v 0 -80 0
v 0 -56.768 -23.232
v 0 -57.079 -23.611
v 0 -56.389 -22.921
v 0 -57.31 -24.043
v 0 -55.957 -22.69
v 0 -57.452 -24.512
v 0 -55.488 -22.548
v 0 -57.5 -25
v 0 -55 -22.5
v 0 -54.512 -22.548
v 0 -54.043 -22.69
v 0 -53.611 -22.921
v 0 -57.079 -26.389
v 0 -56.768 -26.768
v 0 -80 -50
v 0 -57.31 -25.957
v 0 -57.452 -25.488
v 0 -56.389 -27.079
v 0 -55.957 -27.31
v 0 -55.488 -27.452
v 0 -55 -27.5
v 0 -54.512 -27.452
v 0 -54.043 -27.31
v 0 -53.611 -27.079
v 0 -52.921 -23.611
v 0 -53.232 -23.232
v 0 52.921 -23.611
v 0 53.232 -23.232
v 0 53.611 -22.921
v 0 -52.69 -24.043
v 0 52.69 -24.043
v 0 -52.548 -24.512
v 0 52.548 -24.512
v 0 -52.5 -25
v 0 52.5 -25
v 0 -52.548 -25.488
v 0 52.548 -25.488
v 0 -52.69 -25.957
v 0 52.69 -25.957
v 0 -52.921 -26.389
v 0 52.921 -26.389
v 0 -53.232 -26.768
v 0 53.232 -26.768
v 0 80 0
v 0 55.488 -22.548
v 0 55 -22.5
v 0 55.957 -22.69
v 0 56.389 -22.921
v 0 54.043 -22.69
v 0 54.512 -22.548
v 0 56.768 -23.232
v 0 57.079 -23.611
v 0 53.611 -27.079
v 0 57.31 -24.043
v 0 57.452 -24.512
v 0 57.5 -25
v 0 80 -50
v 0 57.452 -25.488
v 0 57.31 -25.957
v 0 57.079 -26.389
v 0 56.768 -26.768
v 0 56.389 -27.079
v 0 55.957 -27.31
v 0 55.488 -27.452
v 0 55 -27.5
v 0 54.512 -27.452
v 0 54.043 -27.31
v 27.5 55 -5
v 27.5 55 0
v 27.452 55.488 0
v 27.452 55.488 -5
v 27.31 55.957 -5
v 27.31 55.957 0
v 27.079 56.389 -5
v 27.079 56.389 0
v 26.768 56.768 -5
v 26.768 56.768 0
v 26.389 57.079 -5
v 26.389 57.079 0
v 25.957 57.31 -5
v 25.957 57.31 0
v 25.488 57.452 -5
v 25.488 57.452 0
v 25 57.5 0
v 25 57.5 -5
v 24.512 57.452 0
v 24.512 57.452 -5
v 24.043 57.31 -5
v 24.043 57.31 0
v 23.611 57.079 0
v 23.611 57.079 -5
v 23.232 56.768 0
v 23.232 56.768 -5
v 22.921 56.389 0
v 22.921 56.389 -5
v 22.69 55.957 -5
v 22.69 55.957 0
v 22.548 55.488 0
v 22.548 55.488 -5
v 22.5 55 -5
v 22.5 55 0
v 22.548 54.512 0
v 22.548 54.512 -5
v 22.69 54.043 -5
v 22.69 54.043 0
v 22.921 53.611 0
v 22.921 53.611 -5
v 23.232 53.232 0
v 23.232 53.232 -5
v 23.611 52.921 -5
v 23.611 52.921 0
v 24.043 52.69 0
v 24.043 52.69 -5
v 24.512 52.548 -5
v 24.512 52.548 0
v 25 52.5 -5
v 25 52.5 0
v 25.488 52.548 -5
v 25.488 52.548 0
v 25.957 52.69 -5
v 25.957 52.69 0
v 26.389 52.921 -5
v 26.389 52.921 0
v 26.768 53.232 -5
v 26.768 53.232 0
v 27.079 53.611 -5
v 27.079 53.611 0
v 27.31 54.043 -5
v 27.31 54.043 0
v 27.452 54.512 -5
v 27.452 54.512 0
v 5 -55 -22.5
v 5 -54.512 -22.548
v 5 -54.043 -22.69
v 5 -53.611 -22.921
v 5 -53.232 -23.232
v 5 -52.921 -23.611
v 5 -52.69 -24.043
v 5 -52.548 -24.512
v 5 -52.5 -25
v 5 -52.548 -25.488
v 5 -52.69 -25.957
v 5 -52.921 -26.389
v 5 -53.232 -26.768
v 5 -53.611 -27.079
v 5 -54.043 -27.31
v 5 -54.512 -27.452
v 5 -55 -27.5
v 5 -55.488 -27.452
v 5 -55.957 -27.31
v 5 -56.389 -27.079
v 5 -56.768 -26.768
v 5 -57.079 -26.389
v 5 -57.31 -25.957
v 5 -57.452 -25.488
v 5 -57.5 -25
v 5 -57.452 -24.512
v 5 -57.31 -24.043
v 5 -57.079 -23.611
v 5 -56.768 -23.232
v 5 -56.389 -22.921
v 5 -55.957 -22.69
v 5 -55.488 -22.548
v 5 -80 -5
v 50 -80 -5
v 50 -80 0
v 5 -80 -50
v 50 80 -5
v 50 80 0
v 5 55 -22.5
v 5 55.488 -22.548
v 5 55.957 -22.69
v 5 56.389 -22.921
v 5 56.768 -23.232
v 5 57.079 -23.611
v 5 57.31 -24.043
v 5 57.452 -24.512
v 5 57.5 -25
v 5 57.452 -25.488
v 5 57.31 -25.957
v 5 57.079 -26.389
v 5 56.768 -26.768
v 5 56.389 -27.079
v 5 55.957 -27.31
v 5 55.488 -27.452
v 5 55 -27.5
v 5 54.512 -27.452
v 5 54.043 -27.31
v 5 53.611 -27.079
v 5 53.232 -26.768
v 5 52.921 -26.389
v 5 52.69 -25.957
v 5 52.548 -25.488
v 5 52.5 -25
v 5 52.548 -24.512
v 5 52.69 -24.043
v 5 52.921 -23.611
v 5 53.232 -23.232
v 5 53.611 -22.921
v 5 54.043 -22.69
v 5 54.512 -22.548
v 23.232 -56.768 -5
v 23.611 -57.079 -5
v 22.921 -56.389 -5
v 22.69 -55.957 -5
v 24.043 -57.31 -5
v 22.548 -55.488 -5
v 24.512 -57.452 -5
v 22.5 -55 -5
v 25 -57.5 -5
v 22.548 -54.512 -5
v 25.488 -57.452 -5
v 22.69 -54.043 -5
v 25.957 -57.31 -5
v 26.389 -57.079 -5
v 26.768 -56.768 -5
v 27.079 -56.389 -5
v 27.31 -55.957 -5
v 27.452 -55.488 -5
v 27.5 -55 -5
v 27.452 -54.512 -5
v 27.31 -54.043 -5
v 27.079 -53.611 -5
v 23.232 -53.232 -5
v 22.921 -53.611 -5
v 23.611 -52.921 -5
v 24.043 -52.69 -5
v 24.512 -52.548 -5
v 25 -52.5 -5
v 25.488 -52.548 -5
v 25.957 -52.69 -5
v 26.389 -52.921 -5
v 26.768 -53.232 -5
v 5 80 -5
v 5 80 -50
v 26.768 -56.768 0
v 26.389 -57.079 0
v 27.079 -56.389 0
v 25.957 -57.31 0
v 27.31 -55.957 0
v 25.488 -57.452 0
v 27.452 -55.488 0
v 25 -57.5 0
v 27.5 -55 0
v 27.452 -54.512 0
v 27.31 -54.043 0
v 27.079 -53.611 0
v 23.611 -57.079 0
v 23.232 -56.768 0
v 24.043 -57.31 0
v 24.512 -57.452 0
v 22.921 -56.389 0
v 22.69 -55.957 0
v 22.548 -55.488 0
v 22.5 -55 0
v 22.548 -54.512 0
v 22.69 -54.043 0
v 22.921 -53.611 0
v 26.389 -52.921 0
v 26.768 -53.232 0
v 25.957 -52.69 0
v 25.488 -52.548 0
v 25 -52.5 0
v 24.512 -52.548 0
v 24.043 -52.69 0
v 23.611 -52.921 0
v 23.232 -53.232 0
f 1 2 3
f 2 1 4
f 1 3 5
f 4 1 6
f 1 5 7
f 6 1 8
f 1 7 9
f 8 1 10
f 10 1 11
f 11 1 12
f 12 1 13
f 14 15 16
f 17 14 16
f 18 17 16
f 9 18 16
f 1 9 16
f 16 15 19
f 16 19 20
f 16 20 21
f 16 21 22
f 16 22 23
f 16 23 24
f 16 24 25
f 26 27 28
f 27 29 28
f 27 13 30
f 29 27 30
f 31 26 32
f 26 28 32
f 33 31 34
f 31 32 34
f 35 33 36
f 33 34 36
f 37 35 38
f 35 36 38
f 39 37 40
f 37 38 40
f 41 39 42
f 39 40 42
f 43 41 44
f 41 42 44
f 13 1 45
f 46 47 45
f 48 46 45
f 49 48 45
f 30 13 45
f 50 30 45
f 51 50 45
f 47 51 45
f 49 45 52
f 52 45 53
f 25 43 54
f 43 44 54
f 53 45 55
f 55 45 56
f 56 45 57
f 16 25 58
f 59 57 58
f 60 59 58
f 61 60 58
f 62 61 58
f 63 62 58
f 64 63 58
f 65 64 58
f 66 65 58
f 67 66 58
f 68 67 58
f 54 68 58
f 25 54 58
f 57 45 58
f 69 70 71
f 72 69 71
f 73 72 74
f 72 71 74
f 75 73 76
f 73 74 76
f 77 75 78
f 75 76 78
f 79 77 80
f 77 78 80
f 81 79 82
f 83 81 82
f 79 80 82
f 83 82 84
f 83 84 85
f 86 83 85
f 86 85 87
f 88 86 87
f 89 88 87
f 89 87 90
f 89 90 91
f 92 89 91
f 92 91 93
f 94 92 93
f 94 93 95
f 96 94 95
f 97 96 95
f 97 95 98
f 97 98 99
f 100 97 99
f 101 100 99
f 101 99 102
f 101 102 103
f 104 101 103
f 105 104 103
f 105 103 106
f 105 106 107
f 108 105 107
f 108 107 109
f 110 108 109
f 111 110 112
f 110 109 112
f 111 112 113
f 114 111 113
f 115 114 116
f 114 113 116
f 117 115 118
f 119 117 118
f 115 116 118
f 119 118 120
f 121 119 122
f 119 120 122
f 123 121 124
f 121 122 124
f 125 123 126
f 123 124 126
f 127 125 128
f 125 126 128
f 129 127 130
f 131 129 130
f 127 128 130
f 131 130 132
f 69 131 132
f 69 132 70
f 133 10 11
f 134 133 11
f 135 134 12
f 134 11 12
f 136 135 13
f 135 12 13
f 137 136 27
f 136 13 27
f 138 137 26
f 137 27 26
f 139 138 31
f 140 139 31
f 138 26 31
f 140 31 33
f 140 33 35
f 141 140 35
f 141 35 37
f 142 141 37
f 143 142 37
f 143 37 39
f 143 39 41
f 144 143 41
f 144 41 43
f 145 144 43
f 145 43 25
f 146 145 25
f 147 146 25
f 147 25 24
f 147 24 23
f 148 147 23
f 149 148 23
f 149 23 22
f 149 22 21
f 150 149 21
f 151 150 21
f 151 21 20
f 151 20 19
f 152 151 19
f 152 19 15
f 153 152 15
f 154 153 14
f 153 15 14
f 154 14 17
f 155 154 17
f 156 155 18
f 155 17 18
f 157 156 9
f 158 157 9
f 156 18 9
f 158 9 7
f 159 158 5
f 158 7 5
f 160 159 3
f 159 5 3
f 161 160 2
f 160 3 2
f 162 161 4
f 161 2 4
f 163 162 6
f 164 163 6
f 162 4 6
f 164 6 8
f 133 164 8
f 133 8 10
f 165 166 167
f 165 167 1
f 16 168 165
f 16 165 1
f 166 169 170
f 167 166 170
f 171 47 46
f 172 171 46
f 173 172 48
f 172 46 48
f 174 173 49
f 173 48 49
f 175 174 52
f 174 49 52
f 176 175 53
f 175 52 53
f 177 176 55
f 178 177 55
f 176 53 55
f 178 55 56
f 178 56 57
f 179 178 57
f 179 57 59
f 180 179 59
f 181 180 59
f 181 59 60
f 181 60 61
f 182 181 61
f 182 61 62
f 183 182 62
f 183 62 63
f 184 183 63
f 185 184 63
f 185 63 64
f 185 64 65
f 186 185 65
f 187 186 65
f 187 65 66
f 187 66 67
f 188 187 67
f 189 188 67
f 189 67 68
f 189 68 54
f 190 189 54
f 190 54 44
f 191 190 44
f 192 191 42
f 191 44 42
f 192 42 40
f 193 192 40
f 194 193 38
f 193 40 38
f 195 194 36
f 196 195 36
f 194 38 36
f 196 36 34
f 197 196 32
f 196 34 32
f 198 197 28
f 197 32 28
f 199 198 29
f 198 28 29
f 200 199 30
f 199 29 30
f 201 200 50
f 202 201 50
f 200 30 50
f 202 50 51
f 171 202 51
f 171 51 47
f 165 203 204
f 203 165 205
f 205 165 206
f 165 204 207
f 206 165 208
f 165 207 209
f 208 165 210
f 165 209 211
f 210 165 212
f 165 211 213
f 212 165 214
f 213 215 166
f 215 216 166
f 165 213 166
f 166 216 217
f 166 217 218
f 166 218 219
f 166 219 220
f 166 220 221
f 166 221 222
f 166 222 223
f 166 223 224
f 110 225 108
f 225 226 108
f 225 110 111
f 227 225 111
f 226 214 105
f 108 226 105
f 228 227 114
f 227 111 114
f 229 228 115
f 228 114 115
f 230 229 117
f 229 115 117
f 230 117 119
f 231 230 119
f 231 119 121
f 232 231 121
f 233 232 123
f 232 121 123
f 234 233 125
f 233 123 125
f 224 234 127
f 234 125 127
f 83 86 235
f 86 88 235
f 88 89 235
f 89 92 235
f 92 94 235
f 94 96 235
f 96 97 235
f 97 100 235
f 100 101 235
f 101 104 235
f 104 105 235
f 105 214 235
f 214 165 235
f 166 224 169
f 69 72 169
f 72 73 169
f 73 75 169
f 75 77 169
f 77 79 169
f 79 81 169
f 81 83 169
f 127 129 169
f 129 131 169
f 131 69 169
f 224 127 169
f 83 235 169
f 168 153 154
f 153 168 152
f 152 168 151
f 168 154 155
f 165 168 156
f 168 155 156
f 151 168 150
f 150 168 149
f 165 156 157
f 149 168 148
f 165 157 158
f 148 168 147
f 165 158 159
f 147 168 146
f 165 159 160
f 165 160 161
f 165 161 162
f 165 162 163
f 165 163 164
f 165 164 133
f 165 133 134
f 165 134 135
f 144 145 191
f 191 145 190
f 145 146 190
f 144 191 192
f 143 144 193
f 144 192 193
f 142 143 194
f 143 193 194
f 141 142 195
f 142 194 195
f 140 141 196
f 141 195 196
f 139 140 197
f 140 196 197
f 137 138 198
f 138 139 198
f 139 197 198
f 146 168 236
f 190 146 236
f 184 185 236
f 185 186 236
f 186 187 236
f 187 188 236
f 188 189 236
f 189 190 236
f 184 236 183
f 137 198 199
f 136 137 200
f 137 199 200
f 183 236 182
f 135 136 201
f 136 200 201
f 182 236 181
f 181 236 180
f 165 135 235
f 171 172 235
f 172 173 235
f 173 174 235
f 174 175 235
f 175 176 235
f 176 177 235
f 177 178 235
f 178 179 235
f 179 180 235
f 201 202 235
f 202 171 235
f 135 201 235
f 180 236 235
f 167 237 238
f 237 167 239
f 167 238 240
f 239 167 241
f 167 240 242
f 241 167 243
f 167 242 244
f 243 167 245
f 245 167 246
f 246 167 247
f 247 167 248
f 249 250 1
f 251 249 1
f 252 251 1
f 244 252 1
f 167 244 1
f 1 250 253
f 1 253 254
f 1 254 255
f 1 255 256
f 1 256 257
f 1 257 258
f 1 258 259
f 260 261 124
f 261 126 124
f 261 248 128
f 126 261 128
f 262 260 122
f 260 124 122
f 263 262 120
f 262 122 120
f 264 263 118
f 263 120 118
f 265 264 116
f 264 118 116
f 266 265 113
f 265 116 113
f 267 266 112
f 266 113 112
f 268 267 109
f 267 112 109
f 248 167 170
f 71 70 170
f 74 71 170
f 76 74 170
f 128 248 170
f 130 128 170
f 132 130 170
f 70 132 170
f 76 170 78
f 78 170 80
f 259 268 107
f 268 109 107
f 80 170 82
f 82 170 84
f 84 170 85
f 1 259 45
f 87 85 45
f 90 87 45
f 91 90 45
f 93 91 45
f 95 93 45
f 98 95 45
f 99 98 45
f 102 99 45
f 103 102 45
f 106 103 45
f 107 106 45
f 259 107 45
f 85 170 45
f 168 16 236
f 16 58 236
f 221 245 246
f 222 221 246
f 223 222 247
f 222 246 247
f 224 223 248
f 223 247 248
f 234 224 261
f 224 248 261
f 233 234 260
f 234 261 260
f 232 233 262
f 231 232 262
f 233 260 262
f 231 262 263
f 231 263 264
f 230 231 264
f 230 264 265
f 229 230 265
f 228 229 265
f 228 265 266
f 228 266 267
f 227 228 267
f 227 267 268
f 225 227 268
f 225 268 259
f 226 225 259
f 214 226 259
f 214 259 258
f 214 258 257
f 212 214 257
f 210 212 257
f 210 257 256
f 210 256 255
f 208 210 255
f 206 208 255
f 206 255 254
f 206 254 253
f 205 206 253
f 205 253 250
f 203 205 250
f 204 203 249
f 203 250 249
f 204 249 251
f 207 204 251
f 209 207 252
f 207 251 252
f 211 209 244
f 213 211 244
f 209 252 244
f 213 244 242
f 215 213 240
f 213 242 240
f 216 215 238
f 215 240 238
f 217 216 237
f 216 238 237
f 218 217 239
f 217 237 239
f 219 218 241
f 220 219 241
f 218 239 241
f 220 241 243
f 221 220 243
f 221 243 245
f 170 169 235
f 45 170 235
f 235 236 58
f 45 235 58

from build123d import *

# Parameters (mm, degrees)
BOSS_EXTRUDE1_DEPTH = 80
SKETCH2_R           = 2.5
CUT_EXTRUDE1_DEPTH  = 107.77078252
SKETCH3_R           = 2.5
CUT_EXTRUDE2_DEPTH  = 107.77078252


with BuildPart() as part:
    # Sketch1 → Boss-Extrude1 (new, symmetric)
    with BuildSketch(Plane(origin=(0, 0, 0), x_dir=(1, 0, 0), z_dir=(0, 1, 0))):
        Polygon((0, 0), (0, 50), (5, 50), (5, 5), (50, 5), (50, 0), align=None)
    extrude(amount=BOSS_EXTRUDE1_DEPTH, both=True)

    # Sketch2 → Cut-Extrude1 (cut, through all)
    with BuildSketch(Plane.XY):
        with Locations((25, 55)):
            Circle(SKETCH2_R)
        with Locations((25, -55)):
            Circle(SKETCH2_R)
    extrude(amount=-CUT_EXTRUDE1_DEPTH, mode=Mode.SUBTRACT)

    # Sketch3 → Cut-Extrude2 (cut, through all)
    with BuildSketch(Plane.ZY):
        with Locations((-25, 55)):
            Circle(SKETCH3_R)
        with Locations((-25, -55)):
            Circle(SKETCH3_R)
    extrude(amount=-CUT_EXTRUDE2_DEPTH, mode=Mode.SUBTRACT)


solid = part.part
